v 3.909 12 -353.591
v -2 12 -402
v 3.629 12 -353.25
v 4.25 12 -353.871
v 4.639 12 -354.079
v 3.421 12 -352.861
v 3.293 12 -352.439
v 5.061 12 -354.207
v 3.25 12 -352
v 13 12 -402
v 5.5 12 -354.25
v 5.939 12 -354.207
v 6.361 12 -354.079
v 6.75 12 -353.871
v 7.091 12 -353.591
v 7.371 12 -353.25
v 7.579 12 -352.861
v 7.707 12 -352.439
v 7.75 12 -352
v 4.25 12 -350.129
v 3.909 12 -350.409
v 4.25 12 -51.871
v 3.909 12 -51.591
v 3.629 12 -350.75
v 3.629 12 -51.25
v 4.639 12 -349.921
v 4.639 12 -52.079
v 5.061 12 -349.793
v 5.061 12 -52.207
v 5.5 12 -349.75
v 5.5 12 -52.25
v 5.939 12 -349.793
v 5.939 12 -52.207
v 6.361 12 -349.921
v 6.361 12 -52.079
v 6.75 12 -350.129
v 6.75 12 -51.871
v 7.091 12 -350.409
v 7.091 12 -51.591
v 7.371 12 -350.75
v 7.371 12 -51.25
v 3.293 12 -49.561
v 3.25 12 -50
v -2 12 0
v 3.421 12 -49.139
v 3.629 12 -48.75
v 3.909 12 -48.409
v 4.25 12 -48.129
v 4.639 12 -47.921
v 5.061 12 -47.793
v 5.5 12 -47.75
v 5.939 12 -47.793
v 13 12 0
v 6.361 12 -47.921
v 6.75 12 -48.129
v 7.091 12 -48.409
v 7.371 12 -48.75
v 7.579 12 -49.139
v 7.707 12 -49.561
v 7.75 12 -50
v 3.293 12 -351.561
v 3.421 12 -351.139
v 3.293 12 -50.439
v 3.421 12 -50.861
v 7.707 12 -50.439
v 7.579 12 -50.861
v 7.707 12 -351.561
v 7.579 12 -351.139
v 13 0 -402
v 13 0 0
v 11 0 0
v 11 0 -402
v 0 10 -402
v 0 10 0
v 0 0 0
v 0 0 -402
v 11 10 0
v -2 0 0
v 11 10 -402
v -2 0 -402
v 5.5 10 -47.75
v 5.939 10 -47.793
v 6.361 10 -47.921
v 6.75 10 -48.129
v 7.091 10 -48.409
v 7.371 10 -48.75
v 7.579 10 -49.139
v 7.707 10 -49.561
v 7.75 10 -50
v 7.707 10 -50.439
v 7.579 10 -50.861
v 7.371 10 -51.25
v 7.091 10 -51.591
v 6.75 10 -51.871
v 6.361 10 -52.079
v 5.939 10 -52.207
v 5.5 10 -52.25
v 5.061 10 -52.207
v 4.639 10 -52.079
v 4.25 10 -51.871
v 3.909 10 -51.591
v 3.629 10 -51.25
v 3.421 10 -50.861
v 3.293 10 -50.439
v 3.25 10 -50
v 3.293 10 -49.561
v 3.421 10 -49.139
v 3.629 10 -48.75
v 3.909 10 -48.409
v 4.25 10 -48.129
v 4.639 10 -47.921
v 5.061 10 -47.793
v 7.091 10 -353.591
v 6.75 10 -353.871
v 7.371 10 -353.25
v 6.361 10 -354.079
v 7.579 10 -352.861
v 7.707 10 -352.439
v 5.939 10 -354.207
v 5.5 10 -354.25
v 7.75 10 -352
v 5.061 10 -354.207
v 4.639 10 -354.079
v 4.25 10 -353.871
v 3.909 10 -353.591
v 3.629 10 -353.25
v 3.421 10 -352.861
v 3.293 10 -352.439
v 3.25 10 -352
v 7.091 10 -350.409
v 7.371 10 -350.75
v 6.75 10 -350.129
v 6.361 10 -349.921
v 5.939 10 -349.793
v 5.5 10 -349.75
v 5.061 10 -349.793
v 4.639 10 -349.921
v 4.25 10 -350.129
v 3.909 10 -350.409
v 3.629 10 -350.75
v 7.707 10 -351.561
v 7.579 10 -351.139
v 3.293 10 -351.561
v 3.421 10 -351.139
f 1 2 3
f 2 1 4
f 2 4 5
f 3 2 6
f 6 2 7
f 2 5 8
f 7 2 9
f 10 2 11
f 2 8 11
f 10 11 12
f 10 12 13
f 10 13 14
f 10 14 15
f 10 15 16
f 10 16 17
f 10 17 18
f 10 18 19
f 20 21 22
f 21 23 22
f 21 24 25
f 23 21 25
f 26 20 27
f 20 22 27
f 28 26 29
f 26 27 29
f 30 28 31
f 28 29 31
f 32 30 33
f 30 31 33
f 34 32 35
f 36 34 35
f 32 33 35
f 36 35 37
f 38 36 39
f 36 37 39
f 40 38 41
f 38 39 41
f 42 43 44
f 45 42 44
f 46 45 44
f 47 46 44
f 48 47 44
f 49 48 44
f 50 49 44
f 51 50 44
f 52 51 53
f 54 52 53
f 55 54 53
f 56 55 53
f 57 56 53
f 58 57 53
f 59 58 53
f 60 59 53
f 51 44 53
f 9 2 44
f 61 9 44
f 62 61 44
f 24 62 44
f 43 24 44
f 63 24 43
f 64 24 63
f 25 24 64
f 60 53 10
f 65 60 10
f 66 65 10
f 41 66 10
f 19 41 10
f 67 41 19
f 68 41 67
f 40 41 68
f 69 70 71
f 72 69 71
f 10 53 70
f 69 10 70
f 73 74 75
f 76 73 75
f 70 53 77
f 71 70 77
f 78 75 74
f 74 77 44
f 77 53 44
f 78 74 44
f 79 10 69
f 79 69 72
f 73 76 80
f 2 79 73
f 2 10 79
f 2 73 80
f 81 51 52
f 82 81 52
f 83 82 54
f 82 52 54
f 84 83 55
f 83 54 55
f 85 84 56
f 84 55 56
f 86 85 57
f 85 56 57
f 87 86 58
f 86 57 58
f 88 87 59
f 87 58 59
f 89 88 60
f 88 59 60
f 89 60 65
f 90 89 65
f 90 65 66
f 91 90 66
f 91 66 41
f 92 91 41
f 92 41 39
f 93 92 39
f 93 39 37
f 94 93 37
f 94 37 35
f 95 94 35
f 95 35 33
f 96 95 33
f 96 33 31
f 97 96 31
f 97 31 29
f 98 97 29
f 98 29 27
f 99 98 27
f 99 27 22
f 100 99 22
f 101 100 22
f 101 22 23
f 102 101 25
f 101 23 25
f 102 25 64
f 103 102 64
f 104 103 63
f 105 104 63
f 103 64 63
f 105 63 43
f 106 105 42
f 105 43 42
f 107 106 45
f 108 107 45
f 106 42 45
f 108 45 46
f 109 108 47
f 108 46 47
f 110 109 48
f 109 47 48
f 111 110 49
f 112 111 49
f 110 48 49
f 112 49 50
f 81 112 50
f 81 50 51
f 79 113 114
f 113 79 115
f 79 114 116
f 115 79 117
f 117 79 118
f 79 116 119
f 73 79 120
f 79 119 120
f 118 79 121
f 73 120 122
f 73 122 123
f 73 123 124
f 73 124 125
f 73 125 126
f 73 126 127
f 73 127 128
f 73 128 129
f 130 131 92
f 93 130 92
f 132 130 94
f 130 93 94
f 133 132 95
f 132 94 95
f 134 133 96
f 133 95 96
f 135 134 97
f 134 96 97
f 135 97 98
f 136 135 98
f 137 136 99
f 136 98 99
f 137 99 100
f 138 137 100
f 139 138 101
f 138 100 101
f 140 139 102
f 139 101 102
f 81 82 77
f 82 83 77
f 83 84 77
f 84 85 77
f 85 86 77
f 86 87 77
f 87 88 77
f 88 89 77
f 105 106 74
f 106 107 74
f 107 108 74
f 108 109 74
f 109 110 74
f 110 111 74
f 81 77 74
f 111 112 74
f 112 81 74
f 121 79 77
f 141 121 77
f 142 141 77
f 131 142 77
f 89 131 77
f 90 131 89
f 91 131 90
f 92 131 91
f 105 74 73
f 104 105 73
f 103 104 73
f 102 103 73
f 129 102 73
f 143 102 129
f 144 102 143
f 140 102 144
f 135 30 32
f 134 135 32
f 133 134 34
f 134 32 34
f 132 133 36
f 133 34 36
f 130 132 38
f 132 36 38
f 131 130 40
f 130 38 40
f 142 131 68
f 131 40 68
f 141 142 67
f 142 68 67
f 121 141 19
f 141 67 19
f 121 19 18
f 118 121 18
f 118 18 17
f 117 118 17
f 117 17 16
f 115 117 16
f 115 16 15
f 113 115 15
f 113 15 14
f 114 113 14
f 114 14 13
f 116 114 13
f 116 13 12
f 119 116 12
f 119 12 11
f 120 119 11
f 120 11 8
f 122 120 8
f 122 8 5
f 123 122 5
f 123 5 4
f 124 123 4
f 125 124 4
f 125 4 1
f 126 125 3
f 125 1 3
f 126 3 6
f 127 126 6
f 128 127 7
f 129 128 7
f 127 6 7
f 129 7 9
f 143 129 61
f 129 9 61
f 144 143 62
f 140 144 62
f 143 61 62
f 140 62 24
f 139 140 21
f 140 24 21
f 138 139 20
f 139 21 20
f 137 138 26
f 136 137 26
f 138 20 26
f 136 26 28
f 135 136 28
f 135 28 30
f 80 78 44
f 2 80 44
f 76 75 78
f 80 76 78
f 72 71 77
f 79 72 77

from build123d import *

# Parameters (mm, degrees)
SM_BASE_FLANGE_2_DEPTH = 402
SKETCH_7_R             = 2.25
CUT_EXTRUDE_1_DEPTH    = 403.389115161


# Sheet-metal steps are written as plain solids
with BuildPart() as part:
    # Эскиз6 → Базовая кромка2 (new body)
    with BuildSketch(Plane.XY):
        Polygon((0, 0), (-2, 0), (-2, 12), (13, 12), (13, 0), (11, 0), (11, 10), (0, 10), align=None)
    extrude(amount=-SM_BASE_FLANGE_2_DEPTH)

    # Эскиз7 → Вырез-Вытянуть1 (cut, through all)
    with BuildSketch(Plane(origin=(0, 12, 0), x_dir=(1, 0, 0), z_dir=(0, 1, 0))):
        with Locations(Location((5.5, 50, 0), (0, 0, 270))):
            Circle(SKETCH_7_R)
        with Locations(Location((5.5, 352, 0), (0, 0, 270))):
            Circle(SKETCH_7_R)
    extrude(amount=-CUT_EXTRUDE_1_DEPTH, mode=Mode.SUBTRACT)


solid = part.part
